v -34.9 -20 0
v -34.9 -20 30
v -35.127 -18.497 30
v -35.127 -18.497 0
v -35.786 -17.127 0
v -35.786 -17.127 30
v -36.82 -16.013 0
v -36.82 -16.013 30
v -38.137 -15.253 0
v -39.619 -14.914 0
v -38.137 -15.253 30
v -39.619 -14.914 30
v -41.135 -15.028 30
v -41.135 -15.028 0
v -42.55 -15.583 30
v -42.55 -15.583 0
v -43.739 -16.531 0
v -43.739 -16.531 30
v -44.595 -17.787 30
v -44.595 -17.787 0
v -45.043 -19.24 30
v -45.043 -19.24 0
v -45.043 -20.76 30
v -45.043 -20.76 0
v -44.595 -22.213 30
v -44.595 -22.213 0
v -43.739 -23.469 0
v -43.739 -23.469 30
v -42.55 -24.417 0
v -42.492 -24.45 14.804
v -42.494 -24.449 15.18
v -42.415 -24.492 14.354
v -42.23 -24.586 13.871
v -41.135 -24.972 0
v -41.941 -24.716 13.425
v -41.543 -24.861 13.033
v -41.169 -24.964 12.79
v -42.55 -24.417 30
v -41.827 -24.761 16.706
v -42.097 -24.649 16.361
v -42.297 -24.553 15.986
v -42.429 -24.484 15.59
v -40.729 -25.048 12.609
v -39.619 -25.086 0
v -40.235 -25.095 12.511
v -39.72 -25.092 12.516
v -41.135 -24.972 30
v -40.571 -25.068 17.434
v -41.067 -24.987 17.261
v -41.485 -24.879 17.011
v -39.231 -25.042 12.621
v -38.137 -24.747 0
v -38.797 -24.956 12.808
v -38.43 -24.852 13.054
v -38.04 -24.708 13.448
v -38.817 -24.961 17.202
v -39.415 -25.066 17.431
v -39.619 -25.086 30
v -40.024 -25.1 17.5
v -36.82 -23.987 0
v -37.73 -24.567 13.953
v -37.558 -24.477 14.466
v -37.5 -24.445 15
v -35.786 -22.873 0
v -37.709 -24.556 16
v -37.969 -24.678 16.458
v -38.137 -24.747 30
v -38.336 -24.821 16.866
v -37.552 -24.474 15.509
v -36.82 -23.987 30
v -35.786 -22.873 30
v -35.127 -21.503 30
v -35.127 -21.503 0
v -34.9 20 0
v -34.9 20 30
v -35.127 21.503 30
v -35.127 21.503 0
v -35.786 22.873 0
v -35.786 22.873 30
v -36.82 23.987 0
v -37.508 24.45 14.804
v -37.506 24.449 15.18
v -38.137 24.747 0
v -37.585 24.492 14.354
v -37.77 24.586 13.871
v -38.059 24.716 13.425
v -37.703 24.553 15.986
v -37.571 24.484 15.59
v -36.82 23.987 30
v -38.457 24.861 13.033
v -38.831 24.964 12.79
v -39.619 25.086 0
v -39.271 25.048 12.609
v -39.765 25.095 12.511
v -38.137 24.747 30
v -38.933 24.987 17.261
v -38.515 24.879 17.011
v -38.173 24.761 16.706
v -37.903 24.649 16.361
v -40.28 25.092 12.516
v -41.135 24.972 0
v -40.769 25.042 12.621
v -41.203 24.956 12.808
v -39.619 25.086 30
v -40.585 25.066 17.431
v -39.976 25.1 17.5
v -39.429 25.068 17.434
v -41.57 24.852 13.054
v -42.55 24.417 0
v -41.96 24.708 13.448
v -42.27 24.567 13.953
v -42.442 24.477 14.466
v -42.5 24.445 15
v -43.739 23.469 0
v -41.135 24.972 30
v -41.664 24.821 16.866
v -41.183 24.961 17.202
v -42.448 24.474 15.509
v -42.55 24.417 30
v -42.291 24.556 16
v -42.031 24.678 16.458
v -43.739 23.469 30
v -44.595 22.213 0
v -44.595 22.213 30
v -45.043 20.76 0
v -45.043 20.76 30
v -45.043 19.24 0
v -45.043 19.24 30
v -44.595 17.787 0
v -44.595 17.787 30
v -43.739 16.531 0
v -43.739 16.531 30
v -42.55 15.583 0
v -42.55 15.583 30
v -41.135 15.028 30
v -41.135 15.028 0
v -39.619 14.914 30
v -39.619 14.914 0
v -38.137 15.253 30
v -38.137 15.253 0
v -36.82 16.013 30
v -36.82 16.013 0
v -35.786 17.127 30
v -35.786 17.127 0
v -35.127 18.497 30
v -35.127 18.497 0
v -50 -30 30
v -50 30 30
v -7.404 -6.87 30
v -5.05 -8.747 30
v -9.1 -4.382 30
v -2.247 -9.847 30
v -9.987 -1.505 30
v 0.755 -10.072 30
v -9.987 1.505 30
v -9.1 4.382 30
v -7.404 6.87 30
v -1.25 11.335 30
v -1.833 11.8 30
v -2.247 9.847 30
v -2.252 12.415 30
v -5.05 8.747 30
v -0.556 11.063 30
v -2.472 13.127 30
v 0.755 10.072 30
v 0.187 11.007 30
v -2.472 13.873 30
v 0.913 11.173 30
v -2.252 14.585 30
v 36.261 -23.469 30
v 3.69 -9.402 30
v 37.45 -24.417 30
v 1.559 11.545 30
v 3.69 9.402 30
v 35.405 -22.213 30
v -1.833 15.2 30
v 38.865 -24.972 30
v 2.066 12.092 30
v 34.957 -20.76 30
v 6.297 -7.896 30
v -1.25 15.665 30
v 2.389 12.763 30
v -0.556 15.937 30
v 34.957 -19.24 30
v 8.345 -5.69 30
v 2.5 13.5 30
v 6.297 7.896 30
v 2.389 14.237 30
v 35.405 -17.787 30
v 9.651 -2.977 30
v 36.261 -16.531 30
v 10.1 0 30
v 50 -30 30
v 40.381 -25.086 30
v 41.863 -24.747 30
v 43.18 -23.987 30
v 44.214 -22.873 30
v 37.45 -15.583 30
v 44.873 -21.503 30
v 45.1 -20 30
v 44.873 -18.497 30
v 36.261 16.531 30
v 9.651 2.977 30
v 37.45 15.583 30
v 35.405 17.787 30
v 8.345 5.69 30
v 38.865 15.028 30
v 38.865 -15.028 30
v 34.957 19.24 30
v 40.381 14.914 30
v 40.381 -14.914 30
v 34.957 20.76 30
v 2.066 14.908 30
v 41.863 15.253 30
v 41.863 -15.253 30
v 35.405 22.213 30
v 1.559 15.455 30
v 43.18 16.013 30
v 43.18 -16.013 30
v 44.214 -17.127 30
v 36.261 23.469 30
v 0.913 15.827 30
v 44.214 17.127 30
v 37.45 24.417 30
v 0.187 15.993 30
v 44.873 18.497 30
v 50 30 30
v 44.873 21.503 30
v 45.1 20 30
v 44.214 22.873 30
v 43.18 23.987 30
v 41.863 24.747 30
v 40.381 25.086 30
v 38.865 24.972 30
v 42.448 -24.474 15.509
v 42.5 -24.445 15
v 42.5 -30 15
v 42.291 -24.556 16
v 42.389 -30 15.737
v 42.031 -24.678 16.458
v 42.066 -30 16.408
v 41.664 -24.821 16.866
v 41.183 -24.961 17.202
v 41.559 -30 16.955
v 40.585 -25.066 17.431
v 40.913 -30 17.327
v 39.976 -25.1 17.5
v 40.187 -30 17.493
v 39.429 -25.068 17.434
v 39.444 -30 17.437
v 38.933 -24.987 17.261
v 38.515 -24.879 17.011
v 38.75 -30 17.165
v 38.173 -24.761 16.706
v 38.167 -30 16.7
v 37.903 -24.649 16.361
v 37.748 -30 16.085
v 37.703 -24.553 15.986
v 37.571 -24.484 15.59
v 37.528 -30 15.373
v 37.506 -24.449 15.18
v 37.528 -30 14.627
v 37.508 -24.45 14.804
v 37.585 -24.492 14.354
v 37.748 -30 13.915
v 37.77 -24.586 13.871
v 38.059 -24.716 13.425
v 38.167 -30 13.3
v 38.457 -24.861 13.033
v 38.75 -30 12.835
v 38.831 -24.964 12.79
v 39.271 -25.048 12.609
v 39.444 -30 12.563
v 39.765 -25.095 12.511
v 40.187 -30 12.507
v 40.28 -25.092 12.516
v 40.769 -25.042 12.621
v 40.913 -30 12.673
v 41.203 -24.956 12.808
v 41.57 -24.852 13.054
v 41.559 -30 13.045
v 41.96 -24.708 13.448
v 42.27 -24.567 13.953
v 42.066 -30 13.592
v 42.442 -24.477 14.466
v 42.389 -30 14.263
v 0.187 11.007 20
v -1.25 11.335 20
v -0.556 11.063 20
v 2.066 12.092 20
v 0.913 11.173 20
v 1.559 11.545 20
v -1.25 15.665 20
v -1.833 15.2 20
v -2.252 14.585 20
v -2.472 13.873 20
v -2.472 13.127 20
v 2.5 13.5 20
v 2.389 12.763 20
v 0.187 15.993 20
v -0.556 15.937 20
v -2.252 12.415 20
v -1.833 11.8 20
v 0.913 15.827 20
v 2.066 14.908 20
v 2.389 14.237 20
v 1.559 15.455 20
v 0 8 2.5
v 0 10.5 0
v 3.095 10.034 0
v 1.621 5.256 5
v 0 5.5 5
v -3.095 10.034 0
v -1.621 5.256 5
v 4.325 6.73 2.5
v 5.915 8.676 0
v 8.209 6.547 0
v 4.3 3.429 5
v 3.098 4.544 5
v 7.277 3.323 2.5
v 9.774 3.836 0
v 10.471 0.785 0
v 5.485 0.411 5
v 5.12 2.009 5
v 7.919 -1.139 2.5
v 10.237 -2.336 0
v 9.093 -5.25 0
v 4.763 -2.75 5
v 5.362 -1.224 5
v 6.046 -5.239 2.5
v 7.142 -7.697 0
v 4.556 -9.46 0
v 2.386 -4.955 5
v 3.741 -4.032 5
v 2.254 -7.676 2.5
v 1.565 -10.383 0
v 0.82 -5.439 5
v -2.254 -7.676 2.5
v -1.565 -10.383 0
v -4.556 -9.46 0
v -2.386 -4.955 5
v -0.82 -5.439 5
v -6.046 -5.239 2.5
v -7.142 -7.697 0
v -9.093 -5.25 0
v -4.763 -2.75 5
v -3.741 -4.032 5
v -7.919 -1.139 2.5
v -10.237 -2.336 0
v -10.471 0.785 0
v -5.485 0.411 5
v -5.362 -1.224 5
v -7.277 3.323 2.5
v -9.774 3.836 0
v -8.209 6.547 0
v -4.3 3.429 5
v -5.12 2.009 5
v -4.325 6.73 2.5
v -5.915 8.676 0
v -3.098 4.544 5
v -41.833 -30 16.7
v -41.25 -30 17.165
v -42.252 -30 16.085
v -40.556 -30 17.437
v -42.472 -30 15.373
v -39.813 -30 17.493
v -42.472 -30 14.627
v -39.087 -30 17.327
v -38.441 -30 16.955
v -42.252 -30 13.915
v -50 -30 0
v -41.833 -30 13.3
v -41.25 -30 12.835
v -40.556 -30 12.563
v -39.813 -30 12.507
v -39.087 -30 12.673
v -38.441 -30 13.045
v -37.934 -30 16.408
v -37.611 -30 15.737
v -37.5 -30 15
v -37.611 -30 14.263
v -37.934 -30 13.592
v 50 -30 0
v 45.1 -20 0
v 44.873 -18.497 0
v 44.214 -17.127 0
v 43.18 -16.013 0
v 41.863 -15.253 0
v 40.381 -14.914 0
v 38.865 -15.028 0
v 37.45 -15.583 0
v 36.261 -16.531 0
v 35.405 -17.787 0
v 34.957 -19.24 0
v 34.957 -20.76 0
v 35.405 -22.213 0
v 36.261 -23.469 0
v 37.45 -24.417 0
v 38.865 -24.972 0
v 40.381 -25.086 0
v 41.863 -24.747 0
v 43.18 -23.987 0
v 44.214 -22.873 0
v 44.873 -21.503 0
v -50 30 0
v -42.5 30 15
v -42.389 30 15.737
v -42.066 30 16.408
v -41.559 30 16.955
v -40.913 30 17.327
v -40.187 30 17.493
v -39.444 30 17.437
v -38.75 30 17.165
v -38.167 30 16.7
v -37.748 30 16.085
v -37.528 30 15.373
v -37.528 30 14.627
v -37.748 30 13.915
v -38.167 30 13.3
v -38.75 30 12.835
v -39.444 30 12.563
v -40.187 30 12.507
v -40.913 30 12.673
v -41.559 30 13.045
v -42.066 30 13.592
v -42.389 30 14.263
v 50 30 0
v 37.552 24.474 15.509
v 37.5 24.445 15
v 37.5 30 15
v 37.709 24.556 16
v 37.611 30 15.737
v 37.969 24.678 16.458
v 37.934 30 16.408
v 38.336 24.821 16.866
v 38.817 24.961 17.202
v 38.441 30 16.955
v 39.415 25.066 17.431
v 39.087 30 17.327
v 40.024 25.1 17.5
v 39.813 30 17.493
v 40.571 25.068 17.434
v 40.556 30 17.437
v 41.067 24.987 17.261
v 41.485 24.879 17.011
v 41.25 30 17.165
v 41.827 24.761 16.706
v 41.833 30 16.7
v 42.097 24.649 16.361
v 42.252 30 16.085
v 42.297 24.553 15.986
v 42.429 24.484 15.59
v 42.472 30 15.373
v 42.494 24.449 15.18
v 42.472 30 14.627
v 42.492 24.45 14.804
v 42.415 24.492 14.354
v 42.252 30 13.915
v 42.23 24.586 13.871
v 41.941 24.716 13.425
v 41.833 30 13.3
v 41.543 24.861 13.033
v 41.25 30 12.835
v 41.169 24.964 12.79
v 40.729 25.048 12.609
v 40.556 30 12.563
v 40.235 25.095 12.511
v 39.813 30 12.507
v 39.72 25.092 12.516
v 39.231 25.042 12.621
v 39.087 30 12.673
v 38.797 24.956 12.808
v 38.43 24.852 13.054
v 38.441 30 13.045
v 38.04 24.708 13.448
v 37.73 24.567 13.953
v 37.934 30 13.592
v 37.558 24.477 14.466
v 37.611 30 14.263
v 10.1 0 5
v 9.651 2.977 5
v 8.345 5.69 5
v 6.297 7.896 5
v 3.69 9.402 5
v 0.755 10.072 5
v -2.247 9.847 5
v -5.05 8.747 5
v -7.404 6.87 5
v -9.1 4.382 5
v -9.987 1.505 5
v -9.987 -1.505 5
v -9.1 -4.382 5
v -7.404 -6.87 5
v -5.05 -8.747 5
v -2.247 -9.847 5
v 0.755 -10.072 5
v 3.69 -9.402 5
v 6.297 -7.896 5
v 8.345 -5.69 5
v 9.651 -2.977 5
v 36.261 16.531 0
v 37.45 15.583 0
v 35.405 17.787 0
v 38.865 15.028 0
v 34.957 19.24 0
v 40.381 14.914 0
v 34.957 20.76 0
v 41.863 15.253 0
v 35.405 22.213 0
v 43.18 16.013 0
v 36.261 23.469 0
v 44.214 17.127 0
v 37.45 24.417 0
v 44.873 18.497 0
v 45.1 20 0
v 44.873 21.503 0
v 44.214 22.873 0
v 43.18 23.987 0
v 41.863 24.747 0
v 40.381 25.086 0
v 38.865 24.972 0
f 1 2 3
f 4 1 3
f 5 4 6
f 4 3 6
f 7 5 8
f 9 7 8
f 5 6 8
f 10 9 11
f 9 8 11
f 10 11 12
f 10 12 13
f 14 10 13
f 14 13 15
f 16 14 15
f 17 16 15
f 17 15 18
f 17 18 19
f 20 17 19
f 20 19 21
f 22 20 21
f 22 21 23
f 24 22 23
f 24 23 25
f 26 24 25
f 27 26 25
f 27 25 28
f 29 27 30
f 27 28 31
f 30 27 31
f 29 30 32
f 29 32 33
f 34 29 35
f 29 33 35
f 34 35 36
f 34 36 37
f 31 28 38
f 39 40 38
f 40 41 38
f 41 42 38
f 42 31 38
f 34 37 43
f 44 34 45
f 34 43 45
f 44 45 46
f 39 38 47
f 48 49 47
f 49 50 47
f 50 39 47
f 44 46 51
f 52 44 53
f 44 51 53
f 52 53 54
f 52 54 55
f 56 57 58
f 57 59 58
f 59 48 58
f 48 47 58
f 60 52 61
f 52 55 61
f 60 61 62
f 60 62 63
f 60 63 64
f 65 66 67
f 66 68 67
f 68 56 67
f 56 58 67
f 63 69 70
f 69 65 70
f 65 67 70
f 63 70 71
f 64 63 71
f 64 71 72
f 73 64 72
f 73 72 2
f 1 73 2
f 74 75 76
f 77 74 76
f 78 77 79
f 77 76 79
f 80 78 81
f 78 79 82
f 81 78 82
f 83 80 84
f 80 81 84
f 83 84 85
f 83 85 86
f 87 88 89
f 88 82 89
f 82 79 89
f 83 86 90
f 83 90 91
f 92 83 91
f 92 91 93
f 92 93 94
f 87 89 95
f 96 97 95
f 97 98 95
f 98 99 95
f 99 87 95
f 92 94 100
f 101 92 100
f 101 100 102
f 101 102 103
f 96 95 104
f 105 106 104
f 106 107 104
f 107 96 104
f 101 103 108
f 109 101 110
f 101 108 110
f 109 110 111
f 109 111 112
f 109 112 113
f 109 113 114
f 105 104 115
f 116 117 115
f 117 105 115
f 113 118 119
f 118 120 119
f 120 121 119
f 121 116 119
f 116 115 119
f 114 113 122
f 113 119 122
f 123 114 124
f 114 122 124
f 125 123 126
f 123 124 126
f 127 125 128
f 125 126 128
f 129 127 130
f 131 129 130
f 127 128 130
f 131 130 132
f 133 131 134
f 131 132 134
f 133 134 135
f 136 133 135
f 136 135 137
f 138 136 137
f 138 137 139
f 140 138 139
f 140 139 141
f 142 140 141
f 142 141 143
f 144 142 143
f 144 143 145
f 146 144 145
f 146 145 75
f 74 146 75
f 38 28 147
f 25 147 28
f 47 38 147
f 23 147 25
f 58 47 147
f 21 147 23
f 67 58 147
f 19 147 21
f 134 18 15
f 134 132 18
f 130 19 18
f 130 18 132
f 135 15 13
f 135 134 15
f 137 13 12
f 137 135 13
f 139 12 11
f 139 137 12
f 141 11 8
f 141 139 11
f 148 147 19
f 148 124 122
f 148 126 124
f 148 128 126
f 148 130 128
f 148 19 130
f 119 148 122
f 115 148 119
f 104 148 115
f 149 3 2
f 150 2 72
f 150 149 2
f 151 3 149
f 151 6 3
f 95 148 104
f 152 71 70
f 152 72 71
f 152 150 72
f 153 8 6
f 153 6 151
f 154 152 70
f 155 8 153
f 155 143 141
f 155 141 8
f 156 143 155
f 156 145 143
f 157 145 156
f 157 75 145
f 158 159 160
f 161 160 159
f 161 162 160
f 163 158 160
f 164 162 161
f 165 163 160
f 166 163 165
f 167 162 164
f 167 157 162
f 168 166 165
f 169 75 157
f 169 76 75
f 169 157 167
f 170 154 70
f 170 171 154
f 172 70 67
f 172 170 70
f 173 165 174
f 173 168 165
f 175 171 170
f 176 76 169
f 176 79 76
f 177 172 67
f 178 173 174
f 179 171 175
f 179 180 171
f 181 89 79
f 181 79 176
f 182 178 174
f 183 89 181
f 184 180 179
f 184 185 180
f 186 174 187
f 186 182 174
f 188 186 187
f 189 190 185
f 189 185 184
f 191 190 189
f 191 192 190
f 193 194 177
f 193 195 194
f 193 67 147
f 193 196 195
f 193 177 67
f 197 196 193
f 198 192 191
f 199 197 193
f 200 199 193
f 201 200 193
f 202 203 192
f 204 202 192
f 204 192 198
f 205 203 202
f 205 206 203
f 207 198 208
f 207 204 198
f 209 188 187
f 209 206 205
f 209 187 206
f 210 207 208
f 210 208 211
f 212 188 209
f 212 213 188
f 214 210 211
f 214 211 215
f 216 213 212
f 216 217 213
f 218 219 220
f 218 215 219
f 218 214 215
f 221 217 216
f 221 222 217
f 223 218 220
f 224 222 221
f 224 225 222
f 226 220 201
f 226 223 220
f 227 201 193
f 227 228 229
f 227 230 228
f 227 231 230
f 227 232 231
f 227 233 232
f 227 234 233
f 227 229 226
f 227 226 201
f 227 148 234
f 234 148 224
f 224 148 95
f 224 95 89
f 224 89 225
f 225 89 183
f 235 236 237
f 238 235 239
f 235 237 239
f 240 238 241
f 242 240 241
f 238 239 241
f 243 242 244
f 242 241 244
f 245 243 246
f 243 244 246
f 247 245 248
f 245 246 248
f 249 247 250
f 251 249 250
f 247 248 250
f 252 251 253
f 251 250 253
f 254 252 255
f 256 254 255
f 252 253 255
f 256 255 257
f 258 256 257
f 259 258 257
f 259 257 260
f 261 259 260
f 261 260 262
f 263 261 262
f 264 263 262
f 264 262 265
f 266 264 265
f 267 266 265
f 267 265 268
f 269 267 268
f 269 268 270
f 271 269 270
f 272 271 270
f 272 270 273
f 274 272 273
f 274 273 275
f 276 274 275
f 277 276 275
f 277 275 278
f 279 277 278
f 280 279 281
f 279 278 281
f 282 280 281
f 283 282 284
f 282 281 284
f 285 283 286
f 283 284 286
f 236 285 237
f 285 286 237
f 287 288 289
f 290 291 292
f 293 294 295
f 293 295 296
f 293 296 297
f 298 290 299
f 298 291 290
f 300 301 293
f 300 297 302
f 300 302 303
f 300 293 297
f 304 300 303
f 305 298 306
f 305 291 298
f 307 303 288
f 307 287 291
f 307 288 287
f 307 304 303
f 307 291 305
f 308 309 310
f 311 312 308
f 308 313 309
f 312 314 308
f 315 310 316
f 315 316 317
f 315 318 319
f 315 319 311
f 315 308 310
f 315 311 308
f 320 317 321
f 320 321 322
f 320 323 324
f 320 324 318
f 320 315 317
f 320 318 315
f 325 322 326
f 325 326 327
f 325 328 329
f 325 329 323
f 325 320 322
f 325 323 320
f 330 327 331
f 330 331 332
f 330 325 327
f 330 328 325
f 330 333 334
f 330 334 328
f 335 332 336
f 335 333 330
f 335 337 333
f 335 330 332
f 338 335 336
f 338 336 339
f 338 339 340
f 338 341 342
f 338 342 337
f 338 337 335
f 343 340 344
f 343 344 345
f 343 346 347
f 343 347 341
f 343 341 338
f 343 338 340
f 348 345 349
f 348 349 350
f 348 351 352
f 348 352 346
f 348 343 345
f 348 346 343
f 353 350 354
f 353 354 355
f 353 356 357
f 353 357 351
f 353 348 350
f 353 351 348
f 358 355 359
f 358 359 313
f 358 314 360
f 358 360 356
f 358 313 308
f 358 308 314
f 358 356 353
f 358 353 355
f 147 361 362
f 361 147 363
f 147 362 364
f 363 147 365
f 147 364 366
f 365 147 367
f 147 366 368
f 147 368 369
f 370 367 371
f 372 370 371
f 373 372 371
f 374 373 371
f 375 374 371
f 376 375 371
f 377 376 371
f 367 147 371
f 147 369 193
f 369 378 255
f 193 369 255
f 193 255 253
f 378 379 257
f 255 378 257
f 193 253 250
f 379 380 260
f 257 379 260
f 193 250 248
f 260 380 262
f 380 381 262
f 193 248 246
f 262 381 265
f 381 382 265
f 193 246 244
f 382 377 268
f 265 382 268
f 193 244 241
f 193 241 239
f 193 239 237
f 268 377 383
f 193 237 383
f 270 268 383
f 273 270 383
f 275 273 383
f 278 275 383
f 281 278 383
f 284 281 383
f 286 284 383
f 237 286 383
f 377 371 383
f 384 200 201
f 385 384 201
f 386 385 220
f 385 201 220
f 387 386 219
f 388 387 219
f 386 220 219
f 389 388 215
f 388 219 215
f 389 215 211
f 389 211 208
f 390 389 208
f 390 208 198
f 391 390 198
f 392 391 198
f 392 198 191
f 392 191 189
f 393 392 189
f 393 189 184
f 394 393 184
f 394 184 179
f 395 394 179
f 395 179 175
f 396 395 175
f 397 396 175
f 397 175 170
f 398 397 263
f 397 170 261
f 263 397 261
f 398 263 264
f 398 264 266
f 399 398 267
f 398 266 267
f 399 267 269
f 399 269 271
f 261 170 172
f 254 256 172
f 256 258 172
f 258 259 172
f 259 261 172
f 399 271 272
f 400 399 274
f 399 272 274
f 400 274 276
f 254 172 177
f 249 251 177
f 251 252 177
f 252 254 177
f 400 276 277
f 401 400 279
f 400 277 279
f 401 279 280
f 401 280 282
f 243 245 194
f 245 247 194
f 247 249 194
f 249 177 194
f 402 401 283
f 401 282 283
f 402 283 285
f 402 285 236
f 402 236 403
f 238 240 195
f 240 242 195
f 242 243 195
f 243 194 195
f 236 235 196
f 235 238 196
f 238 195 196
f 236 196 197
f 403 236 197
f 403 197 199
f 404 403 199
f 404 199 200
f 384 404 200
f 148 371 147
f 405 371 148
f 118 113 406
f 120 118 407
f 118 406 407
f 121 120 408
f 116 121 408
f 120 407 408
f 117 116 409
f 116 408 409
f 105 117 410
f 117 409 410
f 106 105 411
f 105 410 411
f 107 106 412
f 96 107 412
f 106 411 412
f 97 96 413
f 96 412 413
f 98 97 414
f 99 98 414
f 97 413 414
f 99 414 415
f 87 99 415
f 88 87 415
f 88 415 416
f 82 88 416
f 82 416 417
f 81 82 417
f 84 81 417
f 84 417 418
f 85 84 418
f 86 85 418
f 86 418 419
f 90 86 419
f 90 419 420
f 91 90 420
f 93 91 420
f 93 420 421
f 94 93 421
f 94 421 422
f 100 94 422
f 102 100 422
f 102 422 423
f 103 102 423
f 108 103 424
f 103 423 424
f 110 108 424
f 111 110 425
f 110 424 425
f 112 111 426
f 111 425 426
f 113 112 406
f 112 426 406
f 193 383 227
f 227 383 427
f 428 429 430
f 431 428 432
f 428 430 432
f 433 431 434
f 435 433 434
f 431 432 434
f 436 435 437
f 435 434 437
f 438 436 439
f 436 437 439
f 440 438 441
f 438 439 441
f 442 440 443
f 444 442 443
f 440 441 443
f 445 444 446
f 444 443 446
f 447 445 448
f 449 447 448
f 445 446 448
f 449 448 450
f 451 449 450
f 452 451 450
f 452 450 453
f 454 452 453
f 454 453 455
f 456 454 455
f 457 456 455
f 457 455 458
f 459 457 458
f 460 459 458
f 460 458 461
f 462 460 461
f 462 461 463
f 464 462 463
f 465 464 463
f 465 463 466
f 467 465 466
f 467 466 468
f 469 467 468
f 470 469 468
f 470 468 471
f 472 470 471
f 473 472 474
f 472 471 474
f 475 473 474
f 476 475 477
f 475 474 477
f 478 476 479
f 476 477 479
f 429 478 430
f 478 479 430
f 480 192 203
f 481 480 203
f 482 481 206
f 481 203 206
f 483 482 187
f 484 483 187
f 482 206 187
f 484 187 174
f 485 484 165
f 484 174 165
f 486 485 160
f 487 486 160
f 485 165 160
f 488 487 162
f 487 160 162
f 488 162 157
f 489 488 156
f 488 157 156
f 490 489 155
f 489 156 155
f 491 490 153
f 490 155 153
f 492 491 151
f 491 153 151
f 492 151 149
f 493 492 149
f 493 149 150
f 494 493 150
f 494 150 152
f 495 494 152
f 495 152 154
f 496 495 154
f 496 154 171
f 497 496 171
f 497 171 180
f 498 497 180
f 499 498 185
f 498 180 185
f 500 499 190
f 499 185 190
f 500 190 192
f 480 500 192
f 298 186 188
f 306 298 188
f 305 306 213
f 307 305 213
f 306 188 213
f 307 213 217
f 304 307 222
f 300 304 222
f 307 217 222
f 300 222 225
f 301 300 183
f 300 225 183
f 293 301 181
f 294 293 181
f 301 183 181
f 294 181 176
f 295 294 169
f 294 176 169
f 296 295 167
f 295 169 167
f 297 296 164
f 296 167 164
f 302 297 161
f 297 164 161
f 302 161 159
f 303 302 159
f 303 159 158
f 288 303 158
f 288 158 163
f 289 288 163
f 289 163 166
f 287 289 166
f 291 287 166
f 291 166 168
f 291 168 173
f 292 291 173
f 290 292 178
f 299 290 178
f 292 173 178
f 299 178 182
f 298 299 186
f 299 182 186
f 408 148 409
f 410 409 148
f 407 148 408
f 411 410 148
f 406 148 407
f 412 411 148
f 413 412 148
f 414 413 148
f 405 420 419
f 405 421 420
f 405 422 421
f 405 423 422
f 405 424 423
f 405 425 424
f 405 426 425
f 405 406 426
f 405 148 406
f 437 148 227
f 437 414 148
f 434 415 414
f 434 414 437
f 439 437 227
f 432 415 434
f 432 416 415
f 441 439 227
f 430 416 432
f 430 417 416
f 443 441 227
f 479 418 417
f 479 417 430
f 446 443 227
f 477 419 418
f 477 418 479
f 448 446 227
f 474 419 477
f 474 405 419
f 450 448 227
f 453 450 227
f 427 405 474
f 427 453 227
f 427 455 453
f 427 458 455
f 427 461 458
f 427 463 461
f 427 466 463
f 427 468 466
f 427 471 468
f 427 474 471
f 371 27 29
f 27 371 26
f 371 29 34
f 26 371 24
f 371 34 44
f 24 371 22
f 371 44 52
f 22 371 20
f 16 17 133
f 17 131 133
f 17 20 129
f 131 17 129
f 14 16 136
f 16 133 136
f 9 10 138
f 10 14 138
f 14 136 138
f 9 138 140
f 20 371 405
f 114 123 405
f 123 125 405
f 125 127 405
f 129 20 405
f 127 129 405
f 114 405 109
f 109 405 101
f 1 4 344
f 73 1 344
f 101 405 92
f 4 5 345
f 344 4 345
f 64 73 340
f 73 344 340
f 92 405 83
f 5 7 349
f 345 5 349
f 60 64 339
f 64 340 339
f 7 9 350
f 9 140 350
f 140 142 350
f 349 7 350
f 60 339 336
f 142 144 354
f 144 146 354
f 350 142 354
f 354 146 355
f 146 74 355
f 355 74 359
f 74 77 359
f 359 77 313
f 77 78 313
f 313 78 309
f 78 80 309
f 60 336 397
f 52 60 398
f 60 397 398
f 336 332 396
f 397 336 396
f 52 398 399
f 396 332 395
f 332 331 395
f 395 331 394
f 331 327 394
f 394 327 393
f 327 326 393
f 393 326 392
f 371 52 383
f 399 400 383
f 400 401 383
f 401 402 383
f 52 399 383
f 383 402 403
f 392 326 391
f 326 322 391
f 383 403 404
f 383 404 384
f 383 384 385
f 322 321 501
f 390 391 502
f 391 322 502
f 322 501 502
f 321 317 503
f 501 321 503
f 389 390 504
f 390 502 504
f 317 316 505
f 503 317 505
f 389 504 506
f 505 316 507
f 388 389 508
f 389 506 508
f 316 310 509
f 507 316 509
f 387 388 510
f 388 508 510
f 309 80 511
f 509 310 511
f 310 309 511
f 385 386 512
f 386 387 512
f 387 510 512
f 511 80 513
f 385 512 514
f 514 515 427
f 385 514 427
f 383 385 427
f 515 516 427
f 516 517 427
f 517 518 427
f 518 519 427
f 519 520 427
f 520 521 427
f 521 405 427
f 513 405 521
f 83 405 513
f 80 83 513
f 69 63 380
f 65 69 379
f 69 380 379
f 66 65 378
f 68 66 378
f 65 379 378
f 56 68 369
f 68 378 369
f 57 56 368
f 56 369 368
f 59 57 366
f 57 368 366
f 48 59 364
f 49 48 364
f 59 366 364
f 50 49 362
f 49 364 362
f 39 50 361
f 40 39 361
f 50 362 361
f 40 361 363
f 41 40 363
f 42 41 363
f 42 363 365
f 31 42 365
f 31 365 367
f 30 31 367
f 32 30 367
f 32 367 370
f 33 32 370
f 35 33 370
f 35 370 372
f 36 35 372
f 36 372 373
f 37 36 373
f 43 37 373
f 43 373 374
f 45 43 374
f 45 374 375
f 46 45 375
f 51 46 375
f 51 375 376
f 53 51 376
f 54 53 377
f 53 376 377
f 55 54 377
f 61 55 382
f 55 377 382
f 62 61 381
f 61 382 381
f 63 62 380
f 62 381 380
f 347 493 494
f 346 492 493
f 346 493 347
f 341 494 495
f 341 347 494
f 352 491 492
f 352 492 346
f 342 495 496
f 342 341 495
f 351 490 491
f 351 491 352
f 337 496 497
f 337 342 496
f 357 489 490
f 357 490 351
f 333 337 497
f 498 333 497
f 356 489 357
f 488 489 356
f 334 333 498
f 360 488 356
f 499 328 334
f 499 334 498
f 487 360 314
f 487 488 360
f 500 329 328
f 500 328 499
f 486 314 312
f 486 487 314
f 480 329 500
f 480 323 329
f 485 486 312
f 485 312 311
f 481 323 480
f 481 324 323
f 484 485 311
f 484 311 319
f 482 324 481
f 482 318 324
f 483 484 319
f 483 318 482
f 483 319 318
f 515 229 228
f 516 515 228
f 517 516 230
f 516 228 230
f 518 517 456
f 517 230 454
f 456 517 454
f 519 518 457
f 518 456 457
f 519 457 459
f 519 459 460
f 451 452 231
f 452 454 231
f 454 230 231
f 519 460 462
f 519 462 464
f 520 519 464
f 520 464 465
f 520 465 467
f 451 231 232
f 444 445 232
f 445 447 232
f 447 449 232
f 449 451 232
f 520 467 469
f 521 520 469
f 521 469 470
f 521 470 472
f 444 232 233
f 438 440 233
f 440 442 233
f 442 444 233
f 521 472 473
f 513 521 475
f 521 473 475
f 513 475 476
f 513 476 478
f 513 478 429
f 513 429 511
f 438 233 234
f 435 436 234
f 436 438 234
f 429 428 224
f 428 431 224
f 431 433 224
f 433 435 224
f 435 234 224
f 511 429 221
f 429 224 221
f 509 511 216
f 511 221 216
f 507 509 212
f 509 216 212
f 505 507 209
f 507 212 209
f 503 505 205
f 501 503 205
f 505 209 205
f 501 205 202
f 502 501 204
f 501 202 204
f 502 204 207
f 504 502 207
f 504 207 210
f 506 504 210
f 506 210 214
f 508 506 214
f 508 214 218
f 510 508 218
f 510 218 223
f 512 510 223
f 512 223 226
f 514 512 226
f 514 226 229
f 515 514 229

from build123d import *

# Parameters (mm, degrees)
F0_W      = 100
F0_H      = 60
F1_DEPTH  = 30
F2_R      = 10.1
F3_DEPTH  = 25
F4_R      = 5.1
F5_DEPTH  = 30.001
F9_R      = 2.5
F10_DEPTH = 10
F11_R     = 2.5
F12_DEPTH = 10
F13_R     = 2.5
F14_DEPTH = 10


with BuildPart() as f1:
    # F0 (on Top) → F1 (new body)
    with BuildSketch(Plane.XY):
        Rectangle(F0_W, F0_H)
    extrude(amount=F1_DEPTH)

    # F2 (on face) → F3 (cut)
    with BuildSketch(Plane.XY.offset(30)):
        Circle(F2_R)
    extrude(amount=-F3_DEPTH, mode=Mode.SUBTRACT)

    # F4 (on face) → F5 (cut, through all)
    with BuildSketch(Plane.XY.offset(30)):
        with Locations((-40, 20)):
            Circle(F4_R)
        with Locations((-40, -20)):
            Circle(F4_R)
        with Locations((40, 20)):
            Circle(F4_R)
        with Locations((40, -20)):
            Circle(F4_R)
    extrude(amount=-F5_DEPTH, mode=Mode.SUBTRACT)

    # F6 (on Right) → F8 (revolve, cut)
    with BuildSketch(Plane.YZ):
        Polygon((0, 10.5), (0, 0), (10.5, 0), align=None)
    revolve(axis=Axis((0, 0, -23.476606), (0, 0, -1)), mode=Mode.SUBTRACT)

    # F9 (on face) → F10 (cut)
    with BuildSketch(Plane.XZ.offset(30)):
        with Locations((-40, 15)):
            Circle(F9_R)
        with Locations((40, 15)):
            Circle(F9_R)
    extrude(amount=-F10_DEPTH, mode=Mode.SUBTRACT)

    # F11 (on face) → F12 (cut)
    with BuildSketch(Plane(origin=(0, 30, 0), x_dir=(-1, 0, 0), z_dir=(0, 1, 0))):
        with Locations((-40, 15)):
            Circle(F11_R)
        with Locations((40, 15)):
            Circle(F11_R)
    extrude(amount=-F12_DEPTH, mode=Mode.SUBTRACT)

    # F13 (on face) → F14 (cut)
    with BuildSketch(Plane.XY.offset(30)):
        with Locations((0, 13.5)):
            Circle(F13_R)
    extrude(amount=-F14_DEPTH, mode=Mode.SUBTRACT)


solid = f1.part
